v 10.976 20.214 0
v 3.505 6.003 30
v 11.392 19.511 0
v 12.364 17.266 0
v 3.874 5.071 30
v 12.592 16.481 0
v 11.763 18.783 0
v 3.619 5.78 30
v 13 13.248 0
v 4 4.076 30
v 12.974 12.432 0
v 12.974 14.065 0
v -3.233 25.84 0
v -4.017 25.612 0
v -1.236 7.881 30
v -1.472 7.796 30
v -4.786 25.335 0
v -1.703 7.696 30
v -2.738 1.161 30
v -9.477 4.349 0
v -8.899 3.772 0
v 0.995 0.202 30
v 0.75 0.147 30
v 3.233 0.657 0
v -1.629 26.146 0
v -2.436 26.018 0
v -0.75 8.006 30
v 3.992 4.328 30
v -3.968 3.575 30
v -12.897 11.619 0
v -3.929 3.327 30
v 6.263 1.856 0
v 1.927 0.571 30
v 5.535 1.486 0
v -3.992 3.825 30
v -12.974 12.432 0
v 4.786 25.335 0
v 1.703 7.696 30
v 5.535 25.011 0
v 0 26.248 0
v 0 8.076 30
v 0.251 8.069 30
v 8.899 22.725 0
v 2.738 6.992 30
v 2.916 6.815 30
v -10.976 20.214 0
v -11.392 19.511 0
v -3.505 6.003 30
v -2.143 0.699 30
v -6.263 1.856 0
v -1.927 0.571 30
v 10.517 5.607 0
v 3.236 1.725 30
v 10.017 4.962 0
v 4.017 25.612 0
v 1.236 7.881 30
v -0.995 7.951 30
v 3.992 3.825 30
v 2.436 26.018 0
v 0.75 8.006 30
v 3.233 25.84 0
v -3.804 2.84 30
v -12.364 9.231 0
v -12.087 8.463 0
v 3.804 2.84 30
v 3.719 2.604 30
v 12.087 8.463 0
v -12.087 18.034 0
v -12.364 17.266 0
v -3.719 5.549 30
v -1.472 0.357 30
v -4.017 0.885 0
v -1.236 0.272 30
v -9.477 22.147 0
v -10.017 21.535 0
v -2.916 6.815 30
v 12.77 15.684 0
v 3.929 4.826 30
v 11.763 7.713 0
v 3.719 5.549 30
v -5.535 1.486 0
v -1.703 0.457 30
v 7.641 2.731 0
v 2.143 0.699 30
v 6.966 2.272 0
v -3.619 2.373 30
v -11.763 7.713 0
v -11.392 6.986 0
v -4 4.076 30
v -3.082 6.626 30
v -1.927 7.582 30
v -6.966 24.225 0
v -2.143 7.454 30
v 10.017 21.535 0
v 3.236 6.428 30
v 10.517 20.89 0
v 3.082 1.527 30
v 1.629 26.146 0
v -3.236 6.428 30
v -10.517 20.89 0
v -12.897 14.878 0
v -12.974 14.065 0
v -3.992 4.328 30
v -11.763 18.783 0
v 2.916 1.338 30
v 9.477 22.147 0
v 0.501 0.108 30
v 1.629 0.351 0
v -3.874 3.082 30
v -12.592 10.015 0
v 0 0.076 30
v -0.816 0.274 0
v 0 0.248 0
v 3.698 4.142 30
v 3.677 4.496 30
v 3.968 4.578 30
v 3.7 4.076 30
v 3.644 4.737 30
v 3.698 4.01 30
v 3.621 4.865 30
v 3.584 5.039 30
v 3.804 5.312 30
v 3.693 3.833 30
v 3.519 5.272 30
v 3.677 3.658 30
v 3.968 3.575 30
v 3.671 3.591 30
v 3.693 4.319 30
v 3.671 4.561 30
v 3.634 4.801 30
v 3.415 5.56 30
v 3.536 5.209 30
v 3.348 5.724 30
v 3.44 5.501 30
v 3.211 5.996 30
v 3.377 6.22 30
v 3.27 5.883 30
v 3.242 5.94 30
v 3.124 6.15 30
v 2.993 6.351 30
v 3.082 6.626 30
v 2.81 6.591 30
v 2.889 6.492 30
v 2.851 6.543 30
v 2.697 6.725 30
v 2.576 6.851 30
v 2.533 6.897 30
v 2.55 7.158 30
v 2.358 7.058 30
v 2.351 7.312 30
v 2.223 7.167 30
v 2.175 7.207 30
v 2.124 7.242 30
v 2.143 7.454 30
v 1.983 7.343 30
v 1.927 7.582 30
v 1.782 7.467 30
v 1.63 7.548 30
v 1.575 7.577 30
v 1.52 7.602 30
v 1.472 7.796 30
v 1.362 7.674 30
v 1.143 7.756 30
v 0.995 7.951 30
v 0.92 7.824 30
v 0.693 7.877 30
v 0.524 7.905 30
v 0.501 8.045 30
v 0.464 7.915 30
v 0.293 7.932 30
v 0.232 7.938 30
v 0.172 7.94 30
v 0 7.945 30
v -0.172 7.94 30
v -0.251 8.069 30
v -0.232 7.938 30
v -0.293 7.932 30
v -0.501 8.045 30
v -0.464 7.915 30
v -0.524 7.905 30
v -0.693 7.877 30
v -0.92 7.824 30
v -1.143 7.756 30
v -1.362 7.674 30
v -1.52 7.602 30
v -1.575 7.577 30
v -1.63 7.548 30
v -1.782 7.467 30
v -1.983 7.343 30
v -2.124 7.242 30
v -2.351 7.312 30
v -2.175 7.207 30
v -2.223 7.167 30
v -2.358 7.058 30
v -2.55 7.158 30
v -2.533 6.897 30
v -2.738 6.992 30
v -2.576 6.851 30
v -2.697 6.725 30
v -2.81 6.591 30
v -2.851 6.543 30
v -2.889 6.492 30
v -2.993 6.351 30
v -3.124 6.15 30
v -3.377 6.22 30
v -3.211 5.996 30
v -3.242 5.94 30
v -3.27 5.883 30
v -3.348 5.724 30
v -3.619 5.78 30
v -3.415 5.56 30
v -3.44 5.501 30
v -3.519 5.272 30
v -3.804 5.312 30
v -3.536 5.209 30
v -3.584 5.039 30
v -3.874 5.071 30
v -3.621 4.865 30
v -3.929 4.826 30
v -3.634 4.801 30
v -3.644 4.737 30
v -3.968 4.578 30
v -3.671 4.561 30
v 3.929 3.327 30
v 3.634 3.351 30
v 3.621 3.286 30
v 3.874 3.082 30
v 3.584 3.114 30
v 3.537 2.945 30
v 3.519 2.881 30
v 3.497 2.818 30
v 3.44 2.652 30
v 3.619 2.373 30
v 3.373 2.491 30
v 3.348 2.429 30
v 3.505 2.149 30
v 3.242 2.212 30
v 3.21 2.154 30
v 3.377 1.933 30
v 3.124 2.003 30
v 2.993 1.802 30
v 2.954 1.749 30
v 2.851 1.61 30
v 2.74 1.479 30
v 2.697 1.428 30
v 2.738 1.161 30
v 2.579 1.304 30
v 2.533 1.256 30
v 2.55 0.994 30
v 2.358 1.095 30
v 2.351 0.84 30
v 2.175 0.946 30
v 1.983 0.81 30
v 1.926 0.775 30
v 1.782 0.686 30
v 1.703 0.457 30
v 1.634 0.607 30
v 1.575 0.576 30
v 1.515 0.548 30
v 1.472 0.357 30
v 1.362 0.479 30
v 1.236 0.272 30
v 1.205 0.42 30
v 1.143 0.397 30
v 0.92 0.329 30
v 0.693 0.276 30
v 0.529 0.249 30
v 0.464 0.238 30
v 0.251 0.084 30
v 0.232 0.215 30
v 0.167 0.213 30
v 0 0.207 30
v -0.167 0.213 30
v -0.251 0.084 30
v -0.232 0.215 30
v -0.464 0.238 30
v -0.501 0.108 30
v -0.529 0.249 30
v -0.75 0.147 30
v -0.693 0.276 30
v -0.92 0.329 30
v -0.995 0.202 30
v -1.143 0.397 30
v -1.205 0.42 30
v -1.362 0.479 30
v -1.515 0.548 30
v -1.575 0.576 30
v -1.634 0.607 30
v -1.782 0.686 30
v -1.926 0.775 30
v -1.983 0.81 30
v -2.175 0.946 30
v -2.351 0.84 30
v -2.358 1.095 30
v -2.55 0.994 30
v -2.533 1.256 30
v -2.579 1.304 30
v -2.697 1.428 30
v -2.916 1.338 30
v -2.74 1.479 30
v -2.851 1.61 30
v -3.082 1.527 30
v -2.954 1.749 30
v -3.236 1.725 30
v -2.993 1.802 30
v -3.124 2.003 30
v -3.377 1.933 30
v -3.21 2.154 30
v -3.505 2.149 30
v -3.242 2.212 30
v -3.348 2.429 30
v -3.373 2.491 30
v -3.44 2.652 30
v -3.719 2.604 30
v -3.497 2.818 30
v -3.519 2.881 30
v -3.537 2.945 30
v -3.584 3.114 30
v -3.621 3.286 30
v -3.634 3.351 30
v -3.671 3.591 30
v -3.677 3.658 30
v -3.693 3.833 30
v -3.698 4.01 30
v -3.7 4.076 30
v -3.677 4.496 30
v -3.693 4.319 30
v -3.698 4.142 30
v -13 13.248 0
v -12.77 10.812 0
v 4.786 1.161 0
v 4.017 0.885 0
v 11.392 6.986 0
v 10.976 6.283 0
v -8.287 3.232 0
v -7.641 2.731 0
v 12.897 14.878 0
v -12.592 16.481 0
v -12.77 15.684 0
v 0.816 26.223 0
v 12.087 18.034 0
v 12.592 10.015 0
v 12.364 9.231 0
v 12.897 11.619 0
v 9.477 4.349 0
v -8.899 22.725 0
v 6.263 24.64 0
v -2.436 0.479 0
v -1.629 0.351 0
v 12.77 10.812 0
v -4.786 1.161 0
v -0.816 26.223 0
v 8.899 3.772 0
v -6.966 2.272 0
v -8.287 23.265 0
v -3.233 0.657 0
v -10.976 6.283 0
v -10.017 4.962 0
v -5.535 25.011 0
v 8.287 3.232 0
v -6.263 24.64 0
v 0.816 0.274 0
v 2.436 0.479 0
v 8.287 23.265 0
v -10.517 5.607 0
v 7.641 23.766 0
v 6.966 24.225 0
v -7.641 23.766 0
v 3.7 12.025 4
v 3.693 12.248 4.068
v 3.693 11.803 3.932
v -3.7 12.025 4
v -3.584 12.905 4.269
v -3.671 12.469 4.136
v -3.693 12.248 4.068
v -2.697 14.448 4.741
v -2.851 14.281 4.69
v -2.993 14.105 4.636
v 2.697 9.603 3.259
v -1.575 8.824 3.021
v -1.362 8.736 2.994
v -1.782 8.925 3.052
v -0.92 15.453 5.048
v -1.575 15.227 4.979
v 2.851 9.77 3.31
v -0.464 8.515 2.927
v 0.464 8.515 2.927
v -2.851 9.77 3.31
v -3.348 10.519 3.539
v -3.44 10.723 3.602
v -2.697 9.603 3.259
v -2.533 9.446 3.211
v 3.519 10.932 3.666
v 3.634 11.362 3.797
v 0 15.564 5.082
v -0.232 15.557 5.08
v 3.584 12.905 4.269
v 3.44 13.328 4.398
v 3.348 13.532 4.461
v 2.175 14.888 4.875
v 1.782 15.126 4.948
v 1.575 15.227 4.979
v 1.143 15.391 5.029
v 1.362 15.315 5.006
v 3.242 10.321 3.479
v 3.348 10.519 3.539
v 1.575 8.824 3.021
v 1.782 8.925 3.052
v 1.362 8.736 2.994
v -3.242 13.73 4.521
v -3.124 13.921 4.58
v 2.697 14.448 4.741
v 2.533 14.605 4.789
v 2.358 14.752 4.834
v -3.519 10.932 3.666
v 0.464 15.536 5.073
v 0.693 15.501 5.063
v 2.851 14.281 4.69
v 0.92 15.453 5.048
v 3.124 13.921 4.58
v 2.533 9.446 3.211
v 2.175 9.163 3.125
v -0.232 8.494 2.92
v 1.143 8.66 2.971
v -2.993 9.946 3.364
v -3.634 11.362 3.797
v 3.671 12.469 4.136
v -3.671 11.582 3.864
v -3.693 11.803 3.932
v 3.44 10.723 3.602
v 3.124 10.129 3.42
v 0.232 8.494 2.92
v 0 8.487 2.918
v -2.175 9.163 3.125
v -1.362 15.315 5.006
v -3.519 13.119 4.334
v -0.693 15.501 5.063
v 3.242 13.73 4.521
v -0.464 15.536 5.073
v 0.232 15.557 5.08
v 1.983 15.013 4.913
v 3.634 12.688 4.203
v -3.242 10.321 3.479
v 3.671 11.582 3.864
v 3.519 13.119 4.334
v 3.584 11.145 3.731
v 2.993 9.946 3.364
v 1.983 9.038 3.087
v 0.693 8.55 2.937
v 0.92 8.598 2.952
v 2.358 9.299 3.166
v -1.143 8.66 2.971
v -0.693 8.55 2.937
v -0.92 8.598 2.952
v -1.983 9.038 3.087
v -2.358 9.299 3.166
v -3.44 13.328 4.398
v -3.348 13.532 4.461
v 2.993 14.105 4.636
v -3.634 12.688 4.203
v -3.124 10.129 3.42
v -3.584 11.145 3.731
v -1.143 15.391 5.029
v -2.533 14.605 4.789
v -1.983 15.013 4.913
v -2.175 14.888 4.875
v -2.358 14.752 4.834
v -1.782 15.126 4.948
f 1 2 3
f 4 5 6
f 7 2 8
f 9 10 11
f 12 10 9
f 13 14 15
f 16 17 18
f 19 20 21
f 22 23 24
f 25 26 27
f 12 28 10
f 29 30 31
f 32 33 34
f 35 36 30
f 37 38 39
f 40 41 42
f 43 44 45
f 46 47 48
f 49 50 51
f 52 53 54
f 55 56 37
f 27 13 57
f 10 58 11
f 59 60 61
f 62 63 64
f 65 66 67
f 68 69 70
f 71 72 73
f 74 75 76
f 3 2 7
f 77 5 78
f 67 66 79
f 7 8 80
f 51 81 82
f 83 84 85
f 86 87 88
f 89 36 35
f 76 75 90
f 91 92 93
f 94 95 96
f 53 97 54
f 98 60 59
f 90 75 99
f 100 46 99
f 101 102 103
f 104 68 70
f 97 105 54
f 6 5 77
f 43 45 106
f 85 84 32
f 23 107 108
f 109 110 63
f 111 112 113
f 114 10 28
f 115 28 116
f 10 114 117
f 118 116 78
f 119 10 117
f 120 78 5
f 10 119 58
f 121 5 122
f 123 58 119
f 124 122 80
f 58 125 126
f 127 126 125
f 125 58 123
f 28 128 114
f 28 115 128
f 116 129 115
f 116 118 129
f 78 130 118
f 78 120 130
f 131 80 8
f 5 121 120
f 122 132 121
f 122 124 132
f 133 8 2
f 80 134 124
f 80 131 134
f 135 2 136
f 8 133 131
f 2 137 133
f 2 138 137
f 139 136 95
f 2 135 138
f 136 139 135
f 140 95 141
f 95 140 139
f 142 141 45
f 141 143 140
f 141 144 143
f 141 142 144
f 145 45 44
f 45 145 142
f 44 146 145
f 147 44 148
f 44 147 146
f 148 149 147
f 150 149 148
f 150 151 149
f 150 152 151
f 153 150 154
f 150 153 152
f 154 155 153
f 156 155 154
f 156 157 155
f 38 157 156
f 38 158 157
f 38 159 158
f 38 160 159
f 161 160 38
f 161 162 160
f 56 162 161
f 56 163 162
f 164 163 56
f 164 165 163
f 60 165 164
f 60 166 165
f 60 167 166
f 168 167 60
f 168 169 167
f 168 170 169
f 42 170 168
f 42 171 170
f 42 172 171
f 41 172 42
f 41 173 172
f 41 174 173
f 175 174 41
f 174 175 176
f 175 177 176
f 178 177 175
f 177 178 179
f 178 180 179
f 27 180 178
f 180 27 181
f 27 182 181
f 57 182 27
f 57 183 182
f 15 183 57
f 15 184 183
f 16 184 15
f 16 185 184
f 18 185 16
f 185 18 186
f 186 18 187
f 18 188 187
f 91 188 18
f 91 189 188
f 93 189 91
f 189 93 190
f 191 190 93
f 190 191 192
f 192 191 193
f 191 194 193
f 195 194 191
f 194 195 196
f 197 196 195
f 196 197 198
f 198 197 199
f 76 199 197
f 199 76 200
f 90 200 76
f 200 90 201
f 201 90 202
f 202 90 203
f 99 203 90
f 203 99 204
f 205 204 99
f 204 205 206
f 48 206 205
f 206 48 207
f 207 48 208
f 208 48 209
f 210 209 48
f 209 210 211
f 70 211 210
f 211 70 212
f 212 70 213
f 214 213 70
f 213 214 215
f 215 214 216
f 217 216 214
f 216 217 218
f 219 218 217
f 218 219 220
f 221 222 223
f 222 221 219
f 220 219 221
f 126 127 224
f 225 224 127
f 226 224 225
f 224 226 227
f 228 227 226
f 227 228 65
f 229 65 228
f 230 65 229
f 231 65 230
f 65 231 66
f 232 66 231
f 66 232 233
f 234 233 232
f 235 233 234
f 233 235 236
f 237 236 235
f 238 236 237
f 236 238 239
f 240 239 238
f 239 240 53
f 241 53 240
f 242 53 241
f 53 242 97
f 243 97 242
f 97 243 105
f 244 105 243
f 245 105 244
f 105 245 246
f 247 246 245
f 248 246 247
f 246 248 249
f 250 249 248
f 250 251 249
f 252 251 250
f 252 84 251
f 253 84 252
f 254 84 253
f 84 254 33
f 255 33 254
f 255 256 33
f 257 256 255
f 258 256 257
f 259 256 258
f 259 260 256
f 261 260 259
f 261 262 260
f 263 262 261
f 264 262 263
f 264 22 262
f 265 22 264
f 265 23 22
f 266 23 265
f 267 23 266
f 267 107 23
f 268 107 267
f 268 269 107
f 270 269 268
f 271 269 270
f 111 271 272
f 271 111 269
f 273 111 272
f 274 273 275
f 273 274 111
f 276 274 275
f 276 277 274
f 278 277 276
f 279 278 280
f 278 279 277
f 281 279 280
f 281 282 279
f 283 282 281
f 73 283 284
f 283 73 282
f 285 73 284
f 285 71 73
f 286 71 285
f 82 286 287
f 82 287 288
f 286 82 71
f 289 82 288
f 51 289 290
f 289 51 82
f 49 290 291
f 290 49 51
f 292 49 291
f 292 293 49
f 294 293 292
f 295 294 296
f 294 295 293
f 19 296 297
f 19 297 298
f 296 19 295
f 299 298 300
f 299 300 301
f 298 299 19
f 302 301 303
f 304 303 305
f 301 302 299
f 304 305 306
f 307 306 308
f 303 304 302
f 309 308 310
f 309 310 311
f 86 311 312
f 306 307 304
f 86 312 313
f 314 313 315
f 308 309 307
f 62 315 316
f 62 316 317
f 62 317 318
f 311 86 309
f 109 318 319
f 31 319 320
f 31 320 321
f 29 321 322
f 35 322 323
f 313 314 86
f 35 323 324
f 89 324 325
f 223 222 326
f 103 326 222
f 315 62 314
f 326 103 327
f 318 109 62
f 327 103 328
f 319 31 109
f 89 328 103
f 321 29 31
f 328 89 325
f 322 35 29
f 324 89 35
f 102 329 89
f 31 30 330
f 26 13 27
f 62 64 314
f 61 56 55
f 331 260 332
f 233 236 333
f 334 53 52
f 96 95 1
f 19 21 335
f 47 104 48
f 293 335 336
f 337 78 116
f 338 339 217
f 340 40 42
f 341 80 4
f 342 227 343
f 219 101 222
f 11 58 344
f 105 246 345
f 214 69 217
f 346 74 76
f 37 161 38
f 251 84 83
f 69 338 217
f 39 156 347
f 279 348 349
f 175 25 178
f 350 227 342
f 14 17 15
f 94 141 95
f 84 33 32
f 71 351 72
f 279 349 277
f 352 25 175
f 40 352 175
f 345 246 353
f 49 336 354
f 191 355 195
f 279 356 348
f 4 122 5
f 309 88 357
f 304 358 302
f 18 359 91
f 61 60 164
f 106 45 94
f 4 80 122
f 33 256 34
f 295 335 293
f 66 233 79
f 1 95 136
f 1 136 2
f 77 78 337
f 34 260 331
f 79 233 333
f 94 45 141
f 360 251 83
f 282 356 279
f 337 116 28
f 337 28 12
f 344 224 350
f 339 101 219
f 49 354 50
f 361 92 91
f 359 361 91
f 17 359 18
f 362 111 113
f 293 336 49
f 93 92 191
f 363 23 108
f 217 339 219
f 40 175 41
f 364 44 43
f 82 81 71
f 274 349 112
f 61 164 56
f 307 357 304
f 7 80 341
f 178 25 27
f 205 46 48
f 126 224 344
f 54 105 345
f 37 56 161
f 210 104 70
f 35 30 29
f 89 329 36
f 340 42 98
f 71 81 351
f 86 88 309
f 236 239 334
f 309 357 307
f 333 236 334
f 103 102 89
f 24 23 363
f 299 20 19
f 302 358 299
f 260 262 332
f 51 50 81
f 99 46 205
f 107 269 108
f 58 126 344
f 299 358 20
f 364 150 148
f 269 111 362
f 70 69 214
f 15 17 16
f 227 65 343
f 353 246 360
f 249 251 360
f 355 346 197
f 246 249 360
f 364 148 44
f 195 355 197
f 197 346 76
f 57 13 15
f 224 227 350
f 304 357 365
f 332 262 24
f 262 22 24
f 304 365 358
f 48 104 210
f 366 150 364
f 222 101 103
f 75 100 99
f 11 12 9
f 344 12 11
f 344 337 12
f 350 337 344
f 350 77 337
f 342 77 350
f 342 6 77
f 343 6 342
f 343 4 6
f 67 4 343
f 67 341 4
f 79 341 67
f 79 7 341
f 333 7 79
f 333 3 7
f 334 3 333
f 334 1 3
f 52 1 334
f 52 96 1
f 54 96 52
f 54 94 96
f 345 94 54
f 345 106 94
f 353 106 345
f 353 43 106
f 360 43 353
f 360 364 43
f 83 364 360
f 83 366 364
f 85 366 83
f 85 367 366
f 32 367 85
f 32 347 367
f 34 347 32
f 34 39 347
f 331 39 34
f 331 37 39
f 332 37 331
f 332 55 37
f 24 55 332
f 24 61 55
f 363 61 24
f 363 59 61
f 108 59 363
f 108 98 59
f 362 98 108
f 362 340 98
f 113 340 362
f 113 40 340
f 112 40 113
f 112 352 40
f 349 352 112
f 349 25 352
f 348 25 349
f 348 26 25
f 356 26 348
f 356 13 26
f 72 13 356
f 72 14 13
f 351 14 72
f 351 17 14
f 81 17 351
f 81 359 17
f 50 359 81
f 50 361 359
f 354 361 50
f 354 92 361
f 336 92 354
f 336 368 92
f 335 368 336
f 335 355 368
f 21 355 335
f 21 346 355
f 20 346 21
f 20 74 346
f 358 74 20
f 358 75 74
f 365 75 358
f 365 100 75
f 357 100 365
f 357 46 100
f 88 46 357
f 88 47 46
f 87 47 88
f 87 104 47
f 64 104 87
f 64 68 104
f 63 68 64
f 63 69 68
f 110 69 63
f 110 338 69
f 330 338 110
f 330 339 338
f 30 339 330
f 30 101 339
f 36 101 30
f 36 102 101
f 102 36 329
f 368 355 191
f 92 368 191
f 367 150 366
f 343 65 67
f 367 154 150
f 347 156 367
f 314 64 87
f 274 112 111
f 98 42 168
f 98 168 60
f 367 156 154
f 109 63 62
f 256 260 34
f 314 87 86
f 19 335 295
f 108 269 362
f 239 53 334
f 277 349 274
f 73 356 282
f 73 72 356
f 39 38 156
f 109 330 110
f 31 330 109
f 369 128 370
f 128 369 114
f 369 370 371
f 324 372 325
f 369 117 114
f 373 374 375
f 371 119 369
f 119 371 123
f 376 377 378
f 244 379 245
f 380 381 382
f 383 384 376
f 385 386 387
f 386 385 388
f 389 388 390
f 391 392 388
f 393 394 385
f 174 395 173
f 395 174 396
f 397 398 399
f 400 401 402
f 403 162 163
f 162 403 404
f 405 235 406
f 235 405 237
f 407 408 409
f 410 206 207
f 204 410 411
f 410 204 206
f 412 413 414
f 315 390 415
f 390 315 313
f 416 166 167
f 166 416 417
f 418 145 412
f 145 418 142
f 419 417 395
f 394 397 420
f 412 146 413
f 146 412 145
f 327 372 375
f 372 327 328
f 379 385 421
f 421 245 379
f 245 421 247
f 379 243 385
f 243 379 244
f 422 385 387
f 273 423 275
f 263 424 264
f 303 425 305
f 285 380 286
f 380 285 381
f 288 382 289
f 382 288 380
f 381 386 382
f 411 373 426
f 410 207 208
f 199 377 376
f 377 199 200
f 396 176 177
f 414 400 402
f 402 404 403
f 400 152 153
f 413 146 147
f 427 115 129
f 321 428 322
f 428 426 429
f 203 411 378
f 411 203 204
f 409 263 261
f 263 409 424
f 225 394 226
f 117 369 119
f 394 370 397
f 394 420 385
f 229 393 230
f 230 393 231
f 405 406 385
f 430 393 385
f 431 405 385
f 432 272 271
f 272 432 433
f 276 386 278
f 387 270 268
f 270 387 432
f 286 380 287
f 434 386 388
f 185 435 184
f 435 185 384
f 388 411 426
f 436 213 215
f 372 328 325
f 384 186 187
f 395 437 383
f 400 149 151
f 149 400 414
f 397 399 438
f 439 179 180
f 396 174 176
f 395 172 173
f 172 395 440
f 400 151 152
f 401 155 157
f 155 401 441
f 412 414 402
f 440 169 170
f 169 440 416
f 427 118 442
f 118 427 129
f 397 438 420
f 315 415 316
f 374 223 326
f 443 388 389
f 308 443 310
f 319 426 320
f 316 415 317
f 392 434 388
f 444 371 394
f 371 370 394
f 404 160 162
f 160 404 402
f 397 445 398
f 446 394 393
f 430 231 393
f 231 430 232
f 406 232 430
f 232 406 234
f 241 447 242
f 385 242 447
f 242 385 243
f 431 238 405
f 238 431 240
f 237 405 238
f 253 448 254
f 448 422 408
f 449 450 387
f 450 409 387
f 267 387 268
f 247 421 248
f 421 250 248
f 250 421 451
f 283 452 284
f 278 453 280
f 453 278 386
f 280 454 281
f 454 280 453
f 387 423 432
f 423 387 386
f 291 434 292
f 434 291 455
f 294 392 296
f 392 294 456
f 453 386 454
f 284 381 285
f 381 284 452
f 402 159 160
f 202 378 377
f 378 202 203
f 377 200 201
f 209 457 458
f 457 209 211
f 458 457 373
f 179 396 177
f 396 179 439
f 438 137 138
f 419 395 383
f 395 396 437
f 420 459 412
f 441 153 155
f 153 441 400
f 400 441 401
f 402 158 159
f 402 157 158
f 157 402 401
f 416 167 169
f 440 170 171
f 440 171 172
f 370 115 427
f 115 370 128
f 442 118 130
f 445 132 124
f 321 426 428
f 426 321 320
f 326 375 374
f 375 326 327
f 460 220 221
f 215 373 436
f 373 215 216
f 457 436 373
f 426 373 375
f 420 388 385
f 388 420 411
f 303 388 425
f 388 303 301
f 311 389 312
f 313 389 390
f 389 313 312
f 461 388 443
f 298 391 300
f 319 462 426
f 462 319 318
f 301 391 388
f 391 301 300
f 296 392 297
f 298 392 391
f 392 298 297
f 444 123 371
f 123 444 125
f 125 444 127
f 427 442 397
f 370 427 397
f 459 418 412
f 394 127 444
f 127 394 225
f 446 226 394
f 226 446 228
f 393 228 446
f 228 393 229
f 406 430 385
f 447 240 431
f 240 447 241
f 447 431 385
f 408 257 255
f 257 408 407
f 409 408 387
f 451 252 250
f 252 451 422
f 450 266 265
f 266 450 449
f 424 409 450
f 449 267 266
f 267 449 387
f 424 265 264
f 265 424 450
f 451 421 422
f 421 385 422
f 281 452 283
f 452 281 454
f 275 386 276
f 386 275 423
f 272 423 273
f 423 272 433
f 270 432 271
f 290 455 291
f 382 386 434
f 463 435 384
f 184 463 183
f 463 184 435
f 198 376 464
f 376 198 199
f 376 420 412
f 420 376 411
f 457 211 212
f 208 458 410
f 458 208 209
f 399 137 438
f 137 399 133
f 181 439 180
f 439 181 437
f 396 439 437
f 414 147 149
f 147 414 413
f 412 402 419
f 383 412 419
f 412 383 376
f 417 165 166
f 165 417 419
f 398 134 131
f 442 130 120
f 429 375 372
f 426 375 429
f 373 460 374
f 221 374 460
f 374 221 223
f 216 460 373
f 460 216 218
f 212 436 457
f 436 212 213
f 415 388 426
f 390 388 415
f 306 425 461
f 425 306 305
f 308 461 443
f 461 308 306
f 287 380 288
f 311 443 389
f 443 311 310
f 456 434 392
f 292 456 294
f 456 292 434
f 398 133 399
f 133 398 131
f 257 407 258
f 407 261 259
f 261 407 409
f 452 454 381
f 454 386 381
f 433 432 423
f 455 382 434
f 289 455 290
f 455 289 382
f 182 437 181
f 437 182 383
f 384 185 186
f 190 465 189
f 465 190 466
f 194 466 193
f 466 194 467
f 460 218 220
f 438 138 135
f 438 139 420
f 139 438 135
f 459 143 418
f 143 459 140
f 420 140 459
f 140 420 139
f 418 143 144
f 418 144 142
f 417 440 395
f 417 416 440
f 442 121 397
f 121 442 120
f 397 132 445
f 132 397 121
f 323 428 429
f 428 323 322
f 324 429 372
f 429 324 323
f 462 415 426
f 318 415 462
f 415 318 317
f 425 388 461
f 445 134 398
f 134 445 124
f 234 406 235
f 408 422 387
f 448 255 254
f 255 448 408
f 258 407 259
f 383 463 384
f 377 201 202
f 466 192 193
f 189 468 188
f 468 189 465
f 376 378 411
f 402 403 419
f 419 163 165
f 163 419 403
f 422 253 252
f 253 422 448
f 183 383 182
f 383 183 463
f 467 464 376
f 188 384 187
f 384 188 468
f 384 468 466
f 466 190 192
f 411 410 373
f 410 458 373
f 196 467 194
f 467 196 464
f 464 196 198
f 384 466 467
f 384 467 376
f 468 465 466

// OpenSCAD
$fn=100;

alpha=73;
d1=8;
d2=26;
d3=7 + 0.4;
y=4;
h=30;

sc=d1/d2;
x1=h/(tan(alpha)*(1-sc));
x2=x1-(y/tan(alpha));

difference() {
    linear_extrude(h, scale=sc)
    translate([0, x1, 0])
    circle(d=d2);

    translate([0, x2, y])
    rotate([90-alpha, 0, 0])
    cylinder(h=100, d=d3);
    
    // test fit
//    translate([0, 0, -50 + 20])
//    cube(100, center=true);
}
